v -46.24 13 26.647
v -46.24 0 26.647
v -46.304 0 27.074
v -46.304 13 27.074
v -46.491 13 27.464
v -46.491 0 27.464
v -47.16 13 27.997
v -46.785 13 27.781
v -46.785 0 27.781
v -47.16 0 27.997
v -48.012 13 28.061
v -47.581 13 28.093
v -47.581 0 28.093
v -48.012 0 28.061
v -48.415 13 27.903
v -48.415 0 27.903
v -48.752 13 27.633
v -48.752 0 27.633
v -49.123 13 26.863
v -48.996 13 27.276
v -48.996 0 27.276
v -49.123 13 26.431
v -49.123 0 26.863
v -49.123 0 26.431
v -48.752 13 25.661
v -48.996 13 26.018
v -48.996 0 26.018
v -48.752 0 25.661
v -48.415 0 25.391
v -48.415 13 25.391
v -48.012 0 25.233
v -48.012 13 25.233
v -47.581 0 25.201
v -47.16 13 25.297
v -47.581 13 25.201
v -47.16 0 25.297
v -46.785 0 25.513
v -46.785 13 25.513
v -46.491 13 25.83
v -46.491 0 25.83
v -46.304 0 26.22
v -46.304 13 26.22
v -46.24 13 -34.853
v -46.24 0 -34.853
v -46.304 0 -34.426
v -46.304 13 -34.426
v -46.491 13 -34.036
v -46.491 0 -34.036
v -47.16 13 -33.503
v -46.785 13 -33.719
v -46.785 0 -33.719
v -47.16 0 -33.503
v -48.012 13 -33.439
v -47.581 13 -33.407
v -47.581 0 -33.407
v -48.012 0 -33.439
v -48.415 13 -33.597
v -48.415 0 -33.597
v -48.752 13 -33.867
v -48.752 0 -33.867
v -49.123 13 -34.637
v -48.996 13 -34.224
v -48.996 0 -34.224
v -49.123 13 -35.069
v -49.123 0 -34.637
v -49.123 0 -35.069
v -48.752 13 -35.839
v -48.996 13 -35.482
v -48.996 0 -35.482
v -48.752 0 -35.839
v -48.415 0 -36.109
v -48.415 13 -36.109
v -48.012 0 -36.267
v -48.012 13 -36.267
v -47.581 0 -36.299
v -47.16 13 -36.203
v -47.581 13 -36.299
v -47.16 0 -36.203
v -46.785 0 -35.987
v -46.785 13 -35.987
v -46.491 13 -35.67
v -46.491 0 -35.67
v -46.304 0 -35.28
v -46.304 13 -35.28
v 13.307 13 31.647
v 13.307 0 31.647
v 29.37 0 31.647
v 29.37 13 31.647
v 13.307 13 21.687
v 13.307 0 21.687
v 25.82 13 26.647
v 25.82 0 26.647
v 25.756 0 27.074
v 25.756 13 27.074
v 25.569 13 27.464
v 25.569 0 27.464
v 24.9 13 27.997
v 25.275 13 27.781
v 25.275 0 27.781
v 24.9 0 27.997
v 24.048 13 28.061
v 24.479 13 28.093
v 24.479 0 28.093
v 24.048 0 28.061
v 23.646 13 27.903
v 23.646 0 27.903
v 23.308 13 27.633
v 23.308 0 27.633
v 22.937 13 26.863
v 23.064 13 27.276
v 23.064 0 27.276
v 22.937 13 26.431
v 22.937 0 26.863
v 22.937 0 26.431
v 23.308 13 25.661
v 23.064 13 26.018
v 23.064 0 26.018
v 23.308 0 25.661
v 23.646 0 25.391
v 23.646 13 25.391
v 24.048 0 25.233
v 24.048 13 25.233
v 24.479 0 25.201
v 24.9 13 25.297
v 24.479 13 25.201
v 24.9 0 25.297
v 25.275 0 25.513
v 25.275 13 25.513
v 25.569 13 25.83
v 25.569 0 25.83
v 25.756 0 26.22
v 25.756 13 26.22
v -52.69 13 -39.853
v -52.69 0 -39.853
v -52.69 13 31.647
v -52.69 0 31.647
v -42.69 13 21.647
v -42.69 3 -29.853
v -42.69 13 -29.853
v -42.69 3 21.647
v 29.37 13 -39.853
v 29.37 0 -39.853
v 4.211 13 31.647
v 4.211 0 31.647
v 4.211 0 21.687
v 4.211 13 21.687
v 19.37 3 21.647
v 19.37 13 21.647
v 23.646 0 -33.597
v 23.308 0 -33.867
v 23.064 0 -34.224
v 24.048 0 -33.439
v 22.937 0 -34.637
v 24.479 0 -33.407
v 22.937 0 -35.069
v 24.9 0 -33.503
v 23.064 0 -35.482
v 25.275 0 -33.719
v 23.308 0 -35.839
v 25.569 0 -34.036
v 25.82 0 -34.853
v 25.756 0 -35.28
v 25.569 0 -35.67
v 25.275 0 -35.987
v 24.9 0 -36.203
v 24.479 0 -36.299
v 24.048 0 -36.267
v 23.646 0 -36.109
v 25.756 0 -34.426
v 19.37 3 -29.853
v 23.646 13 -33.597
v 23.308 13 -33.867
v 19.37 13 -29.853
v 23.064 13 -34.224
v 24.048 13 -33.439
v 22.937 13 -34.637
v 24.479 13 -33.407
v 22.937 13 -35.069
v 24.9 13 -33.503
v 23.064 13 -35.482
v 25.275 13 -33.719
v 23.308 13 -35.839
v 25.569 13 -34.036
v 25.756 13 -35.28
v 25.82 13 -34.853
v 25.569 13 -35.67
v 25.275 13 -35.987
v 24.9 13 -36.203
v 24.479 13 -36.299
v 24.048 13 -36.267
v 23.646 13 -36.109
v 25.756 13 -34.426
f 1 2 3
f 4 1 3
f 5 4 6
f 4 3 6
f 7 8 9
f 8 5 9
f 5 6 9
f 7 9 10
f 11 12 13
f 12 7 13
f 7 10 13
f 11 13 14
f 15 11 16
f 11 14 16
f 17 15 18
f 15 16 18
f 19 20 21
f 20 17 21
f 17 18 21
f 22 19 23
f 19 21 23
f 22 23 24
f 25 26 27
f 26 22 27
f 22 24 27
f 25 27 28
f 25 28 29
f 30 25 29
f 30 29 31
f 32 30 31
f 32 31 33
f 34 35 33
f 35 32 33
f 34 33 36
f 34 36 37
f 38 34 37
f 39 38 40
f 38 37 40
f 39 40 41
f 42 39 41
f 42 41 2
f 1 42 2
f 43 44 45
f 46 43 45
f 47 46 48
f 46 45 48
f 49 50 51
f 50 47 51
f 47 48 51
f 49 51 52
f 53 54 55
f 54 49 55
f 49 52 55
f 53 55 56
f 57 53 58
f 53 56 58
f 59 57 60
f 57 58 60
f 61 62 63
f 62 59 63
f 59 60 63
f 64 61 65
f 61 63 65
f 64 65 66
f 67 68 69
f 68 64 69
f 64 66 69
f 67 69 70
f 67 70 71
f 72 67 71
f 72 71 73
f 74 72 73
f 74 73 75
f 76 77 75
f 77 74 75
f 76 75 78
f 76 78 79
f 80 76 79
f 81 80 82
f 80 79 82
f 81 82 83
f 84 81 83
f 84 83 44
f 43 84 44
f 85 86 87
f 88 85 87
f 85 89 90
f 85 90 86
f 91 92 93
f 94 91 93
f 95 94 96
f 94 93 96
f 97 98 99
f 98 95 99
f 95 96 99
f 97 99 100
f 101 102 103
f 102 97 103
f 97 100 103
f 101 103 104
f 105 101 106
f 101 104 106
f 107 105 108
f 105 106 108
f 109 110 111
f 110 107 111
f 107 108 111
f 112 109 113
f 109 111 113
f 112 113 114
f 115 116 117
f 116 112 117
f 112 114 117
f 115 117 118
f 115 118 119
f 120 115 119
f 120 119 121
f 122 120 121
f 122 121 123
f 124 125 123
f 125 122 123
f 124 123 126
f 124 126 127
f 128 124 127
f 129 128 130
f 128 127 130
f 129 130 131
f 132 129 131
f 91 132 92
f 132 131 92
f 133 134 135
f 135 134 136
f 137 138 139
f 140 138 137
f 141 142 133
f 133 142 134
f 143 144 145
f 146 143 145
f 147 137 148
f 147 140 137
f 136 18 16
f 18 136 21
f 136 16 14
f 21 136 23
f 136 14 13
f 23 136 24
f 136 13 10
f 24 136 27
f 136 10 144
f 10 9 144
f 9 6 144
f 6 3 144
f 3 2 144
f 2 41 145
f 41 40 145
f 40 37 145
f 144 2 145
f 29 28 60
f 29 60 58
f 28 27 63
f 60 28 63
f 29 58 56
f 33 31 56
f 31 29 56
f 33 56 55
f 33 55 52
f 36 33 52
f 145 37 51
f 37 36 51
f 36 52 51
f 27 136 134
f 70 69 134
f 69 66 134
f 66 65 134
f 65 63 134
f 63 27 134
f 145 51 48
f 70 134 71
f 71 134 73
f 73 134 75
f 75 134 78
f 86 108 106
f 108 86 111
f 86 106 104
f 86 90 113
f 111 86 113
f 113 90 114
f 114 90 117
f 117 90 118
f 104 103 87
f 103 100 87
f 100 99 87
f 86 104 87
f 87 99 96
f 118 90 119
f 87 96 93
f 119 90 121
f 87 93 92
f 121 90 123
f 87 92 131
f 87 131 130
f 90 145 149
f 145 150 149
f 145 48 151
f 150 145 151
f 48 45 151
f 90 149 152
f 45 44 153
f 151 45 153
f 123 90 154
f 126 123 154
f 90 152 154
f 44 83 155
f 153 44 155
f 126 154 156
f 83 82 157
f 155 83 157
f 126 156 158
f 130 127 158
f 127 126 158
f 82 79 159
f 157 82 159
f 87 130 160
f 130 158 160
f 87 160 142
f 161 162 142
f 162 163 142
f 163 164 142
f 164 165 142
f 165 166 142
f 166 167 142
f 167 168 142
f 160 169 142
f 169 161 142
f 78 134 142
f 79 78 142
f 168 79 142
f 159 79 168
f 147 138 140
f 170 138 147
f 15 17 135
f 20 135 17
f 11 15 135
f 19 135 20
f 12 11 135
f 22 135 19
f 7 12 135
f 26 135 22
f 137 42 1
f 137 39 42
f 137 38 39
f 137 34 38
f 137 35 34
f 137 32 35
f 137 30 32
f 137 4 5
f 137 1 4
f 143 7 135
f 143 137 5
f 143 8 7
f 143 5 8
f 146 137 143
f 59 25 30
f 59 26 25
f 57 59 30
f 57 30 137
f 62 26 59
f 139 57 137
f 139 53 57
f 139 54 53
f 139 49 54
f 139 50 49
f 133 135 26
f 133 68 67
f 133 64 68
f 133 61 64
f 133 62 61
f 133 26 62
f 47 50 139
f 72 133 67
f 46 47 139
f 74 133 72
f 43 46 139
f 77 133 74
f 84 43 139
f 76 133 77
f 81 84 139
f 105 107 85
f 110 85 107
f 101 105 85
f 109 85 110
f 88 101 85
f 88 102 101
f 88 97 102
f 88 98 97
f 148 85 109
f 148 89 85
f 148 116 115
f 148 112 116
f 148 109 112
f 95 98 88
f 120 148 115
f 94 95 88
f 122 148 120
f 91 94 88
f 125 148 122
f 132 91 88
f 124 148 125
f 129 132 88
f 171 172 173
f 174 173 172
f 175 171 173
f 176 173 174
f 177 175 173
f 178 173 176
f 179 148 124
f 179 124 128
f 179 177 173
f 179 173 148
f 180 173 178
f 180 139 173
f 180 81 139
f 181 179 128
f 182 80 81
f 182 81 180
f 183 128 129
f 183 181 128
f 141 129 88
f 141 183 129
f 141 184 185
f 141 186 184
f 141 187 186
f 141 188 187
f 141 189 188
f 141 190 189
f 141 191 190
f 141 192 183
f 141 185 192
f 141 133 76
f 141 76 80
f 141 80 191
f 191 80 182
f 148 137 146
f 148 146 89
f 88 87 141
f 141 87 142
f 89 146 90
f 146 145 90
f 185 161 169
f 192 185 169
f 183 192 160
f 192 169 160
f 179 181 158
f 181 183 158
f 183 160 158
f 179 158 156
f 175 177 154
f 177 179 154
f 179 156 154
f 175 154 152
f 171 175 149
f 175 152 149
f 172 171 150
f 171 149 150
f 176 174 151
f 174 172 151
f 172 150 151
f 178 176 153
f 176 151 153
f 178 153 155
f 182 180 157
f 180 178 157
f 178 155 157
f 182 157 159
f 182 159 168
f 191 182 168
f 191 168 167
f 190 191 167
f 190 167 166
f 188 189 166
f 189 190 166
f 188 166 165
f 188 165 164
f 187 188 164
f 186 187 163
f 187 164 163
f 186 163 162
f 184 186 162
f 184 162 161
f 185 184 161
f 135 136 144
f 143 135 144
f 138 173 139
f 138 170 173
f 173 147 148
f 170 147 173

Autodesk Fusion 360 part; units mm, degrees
sketch "Sketch3" plane through (0, 0, 0) normal (0, 1, 0) x (1, 0, 0)
sketch "Sketch4" plane through (0, 0, 0) normal (0, 1, 0) x (1, 0, 0)
sketch "Sketch5" plane through (0, 0, 0) normal (0, 1, 0) x (1, 0, 0)
sketch "Sketch6" plane through (0, 0, 0) normal (0, 1, 0) x (1, 0, 0)
  line L0 (-42.6895, -21.6471) -> (19.3705, -21.6471)
  line L1 (19.3705, -21.6471) -> (19.3705, 29.8529)
  line L2 (19.3705, 29.8529) -> (-42.6895, 29.8529)
  line L3 (-42.6895, 29.8529) -> (-42.6895, -21.6471)
  line L4 (-52.6895, -31.6471) -> (29.3705, -31.6471)
  line L5 (29.3705, -31.6471) -> (29.3705, 39.8529)
  line L6 (29.3705, 39.8529) -> (-52.6895, 39.8529)
  line L7 (-52.6895, 39.8529) -> (-52.6895, -31.6471)
  circle A0 centre (-47.6895, -26.6471) radius 1.45
  circle A1 centre (24.3705, -26.6471) radius 1.45
  circle A2 centre (-47.6895, 34.8529) radius 1.45
  circle A3 centre (24.3705, 34.8529) radius 1.45
  dimension "d52" = 51.5
  dimension "d53" = 62.06
  dimension "d54" = 10
  dimension "d55" = 10
  dimension "d56" = 10
  dimension "d57" = 10
  dimension "d58" = 2.9
  dimension "d59" = 5
  dimension "d60" = 5
  dimension "d61" = 2.9
  dimension "d62" = 5
  dimension "d63" = 5
  dimension "d64" = 2.9
  dimension "d65" = 5
  dimension "d66" = 5
  dimension "d67" = 2.9
  dimension "d68" = 5
  dimension "d69" = 5
extrude "Extrude6" add sketch "Sketch6" along normal blind 13
extrude "Extrude7" add sketch "Sketch6" along normal blind 3 contours L0 L1 L2 L3
sketch "Sketch7" plane through (0, 0, 0) normal (0, 1, 0) x (1, 0, 0)
  line L0 (13.2505, -31.6778) -> (4.2505, -31.6778)
  line L1 (4.2505, -31.6778) -> (4.2505, -21.6778)
  line L2 (4.2505, -21.6778) -> (13.2505, -21.6778)
  line L3 (13.2505, -21.6778) -> (13.2505, -31.6778)
  line L4 (19.3705, -21.6471) -> (19.3705, 29.8529)
  dimension "d74" = 10
  dimension "d75" = 6.12
  dimension "d76" = 9
sketch "Sketch8" plane through (0, 0, 0) normal (0, 1, 0) x (1, 0, 0)
sketch "eee" plane through (0, 0, 0) normal (0, 1, 0) x (1, 0, 0)
  line L0 (13.3073, -31.6778) -> (4.2109, -31.6778)
  line L1 (4.2109, -31.6778) -> (4.2109, -21.6873)
  line L2 (4.2109, -21.6873) -> (13.3073, -21.6873)
  line L3 (13.3073, -21.6873) -> (13.3073, -31.6778)
  line L4 (4.2505, -21.6778) -> (13.2505, -21.6778)
  dimension "d77" = 10
extrude "Extrude8" cut sketch "eee" along normal blind 13
